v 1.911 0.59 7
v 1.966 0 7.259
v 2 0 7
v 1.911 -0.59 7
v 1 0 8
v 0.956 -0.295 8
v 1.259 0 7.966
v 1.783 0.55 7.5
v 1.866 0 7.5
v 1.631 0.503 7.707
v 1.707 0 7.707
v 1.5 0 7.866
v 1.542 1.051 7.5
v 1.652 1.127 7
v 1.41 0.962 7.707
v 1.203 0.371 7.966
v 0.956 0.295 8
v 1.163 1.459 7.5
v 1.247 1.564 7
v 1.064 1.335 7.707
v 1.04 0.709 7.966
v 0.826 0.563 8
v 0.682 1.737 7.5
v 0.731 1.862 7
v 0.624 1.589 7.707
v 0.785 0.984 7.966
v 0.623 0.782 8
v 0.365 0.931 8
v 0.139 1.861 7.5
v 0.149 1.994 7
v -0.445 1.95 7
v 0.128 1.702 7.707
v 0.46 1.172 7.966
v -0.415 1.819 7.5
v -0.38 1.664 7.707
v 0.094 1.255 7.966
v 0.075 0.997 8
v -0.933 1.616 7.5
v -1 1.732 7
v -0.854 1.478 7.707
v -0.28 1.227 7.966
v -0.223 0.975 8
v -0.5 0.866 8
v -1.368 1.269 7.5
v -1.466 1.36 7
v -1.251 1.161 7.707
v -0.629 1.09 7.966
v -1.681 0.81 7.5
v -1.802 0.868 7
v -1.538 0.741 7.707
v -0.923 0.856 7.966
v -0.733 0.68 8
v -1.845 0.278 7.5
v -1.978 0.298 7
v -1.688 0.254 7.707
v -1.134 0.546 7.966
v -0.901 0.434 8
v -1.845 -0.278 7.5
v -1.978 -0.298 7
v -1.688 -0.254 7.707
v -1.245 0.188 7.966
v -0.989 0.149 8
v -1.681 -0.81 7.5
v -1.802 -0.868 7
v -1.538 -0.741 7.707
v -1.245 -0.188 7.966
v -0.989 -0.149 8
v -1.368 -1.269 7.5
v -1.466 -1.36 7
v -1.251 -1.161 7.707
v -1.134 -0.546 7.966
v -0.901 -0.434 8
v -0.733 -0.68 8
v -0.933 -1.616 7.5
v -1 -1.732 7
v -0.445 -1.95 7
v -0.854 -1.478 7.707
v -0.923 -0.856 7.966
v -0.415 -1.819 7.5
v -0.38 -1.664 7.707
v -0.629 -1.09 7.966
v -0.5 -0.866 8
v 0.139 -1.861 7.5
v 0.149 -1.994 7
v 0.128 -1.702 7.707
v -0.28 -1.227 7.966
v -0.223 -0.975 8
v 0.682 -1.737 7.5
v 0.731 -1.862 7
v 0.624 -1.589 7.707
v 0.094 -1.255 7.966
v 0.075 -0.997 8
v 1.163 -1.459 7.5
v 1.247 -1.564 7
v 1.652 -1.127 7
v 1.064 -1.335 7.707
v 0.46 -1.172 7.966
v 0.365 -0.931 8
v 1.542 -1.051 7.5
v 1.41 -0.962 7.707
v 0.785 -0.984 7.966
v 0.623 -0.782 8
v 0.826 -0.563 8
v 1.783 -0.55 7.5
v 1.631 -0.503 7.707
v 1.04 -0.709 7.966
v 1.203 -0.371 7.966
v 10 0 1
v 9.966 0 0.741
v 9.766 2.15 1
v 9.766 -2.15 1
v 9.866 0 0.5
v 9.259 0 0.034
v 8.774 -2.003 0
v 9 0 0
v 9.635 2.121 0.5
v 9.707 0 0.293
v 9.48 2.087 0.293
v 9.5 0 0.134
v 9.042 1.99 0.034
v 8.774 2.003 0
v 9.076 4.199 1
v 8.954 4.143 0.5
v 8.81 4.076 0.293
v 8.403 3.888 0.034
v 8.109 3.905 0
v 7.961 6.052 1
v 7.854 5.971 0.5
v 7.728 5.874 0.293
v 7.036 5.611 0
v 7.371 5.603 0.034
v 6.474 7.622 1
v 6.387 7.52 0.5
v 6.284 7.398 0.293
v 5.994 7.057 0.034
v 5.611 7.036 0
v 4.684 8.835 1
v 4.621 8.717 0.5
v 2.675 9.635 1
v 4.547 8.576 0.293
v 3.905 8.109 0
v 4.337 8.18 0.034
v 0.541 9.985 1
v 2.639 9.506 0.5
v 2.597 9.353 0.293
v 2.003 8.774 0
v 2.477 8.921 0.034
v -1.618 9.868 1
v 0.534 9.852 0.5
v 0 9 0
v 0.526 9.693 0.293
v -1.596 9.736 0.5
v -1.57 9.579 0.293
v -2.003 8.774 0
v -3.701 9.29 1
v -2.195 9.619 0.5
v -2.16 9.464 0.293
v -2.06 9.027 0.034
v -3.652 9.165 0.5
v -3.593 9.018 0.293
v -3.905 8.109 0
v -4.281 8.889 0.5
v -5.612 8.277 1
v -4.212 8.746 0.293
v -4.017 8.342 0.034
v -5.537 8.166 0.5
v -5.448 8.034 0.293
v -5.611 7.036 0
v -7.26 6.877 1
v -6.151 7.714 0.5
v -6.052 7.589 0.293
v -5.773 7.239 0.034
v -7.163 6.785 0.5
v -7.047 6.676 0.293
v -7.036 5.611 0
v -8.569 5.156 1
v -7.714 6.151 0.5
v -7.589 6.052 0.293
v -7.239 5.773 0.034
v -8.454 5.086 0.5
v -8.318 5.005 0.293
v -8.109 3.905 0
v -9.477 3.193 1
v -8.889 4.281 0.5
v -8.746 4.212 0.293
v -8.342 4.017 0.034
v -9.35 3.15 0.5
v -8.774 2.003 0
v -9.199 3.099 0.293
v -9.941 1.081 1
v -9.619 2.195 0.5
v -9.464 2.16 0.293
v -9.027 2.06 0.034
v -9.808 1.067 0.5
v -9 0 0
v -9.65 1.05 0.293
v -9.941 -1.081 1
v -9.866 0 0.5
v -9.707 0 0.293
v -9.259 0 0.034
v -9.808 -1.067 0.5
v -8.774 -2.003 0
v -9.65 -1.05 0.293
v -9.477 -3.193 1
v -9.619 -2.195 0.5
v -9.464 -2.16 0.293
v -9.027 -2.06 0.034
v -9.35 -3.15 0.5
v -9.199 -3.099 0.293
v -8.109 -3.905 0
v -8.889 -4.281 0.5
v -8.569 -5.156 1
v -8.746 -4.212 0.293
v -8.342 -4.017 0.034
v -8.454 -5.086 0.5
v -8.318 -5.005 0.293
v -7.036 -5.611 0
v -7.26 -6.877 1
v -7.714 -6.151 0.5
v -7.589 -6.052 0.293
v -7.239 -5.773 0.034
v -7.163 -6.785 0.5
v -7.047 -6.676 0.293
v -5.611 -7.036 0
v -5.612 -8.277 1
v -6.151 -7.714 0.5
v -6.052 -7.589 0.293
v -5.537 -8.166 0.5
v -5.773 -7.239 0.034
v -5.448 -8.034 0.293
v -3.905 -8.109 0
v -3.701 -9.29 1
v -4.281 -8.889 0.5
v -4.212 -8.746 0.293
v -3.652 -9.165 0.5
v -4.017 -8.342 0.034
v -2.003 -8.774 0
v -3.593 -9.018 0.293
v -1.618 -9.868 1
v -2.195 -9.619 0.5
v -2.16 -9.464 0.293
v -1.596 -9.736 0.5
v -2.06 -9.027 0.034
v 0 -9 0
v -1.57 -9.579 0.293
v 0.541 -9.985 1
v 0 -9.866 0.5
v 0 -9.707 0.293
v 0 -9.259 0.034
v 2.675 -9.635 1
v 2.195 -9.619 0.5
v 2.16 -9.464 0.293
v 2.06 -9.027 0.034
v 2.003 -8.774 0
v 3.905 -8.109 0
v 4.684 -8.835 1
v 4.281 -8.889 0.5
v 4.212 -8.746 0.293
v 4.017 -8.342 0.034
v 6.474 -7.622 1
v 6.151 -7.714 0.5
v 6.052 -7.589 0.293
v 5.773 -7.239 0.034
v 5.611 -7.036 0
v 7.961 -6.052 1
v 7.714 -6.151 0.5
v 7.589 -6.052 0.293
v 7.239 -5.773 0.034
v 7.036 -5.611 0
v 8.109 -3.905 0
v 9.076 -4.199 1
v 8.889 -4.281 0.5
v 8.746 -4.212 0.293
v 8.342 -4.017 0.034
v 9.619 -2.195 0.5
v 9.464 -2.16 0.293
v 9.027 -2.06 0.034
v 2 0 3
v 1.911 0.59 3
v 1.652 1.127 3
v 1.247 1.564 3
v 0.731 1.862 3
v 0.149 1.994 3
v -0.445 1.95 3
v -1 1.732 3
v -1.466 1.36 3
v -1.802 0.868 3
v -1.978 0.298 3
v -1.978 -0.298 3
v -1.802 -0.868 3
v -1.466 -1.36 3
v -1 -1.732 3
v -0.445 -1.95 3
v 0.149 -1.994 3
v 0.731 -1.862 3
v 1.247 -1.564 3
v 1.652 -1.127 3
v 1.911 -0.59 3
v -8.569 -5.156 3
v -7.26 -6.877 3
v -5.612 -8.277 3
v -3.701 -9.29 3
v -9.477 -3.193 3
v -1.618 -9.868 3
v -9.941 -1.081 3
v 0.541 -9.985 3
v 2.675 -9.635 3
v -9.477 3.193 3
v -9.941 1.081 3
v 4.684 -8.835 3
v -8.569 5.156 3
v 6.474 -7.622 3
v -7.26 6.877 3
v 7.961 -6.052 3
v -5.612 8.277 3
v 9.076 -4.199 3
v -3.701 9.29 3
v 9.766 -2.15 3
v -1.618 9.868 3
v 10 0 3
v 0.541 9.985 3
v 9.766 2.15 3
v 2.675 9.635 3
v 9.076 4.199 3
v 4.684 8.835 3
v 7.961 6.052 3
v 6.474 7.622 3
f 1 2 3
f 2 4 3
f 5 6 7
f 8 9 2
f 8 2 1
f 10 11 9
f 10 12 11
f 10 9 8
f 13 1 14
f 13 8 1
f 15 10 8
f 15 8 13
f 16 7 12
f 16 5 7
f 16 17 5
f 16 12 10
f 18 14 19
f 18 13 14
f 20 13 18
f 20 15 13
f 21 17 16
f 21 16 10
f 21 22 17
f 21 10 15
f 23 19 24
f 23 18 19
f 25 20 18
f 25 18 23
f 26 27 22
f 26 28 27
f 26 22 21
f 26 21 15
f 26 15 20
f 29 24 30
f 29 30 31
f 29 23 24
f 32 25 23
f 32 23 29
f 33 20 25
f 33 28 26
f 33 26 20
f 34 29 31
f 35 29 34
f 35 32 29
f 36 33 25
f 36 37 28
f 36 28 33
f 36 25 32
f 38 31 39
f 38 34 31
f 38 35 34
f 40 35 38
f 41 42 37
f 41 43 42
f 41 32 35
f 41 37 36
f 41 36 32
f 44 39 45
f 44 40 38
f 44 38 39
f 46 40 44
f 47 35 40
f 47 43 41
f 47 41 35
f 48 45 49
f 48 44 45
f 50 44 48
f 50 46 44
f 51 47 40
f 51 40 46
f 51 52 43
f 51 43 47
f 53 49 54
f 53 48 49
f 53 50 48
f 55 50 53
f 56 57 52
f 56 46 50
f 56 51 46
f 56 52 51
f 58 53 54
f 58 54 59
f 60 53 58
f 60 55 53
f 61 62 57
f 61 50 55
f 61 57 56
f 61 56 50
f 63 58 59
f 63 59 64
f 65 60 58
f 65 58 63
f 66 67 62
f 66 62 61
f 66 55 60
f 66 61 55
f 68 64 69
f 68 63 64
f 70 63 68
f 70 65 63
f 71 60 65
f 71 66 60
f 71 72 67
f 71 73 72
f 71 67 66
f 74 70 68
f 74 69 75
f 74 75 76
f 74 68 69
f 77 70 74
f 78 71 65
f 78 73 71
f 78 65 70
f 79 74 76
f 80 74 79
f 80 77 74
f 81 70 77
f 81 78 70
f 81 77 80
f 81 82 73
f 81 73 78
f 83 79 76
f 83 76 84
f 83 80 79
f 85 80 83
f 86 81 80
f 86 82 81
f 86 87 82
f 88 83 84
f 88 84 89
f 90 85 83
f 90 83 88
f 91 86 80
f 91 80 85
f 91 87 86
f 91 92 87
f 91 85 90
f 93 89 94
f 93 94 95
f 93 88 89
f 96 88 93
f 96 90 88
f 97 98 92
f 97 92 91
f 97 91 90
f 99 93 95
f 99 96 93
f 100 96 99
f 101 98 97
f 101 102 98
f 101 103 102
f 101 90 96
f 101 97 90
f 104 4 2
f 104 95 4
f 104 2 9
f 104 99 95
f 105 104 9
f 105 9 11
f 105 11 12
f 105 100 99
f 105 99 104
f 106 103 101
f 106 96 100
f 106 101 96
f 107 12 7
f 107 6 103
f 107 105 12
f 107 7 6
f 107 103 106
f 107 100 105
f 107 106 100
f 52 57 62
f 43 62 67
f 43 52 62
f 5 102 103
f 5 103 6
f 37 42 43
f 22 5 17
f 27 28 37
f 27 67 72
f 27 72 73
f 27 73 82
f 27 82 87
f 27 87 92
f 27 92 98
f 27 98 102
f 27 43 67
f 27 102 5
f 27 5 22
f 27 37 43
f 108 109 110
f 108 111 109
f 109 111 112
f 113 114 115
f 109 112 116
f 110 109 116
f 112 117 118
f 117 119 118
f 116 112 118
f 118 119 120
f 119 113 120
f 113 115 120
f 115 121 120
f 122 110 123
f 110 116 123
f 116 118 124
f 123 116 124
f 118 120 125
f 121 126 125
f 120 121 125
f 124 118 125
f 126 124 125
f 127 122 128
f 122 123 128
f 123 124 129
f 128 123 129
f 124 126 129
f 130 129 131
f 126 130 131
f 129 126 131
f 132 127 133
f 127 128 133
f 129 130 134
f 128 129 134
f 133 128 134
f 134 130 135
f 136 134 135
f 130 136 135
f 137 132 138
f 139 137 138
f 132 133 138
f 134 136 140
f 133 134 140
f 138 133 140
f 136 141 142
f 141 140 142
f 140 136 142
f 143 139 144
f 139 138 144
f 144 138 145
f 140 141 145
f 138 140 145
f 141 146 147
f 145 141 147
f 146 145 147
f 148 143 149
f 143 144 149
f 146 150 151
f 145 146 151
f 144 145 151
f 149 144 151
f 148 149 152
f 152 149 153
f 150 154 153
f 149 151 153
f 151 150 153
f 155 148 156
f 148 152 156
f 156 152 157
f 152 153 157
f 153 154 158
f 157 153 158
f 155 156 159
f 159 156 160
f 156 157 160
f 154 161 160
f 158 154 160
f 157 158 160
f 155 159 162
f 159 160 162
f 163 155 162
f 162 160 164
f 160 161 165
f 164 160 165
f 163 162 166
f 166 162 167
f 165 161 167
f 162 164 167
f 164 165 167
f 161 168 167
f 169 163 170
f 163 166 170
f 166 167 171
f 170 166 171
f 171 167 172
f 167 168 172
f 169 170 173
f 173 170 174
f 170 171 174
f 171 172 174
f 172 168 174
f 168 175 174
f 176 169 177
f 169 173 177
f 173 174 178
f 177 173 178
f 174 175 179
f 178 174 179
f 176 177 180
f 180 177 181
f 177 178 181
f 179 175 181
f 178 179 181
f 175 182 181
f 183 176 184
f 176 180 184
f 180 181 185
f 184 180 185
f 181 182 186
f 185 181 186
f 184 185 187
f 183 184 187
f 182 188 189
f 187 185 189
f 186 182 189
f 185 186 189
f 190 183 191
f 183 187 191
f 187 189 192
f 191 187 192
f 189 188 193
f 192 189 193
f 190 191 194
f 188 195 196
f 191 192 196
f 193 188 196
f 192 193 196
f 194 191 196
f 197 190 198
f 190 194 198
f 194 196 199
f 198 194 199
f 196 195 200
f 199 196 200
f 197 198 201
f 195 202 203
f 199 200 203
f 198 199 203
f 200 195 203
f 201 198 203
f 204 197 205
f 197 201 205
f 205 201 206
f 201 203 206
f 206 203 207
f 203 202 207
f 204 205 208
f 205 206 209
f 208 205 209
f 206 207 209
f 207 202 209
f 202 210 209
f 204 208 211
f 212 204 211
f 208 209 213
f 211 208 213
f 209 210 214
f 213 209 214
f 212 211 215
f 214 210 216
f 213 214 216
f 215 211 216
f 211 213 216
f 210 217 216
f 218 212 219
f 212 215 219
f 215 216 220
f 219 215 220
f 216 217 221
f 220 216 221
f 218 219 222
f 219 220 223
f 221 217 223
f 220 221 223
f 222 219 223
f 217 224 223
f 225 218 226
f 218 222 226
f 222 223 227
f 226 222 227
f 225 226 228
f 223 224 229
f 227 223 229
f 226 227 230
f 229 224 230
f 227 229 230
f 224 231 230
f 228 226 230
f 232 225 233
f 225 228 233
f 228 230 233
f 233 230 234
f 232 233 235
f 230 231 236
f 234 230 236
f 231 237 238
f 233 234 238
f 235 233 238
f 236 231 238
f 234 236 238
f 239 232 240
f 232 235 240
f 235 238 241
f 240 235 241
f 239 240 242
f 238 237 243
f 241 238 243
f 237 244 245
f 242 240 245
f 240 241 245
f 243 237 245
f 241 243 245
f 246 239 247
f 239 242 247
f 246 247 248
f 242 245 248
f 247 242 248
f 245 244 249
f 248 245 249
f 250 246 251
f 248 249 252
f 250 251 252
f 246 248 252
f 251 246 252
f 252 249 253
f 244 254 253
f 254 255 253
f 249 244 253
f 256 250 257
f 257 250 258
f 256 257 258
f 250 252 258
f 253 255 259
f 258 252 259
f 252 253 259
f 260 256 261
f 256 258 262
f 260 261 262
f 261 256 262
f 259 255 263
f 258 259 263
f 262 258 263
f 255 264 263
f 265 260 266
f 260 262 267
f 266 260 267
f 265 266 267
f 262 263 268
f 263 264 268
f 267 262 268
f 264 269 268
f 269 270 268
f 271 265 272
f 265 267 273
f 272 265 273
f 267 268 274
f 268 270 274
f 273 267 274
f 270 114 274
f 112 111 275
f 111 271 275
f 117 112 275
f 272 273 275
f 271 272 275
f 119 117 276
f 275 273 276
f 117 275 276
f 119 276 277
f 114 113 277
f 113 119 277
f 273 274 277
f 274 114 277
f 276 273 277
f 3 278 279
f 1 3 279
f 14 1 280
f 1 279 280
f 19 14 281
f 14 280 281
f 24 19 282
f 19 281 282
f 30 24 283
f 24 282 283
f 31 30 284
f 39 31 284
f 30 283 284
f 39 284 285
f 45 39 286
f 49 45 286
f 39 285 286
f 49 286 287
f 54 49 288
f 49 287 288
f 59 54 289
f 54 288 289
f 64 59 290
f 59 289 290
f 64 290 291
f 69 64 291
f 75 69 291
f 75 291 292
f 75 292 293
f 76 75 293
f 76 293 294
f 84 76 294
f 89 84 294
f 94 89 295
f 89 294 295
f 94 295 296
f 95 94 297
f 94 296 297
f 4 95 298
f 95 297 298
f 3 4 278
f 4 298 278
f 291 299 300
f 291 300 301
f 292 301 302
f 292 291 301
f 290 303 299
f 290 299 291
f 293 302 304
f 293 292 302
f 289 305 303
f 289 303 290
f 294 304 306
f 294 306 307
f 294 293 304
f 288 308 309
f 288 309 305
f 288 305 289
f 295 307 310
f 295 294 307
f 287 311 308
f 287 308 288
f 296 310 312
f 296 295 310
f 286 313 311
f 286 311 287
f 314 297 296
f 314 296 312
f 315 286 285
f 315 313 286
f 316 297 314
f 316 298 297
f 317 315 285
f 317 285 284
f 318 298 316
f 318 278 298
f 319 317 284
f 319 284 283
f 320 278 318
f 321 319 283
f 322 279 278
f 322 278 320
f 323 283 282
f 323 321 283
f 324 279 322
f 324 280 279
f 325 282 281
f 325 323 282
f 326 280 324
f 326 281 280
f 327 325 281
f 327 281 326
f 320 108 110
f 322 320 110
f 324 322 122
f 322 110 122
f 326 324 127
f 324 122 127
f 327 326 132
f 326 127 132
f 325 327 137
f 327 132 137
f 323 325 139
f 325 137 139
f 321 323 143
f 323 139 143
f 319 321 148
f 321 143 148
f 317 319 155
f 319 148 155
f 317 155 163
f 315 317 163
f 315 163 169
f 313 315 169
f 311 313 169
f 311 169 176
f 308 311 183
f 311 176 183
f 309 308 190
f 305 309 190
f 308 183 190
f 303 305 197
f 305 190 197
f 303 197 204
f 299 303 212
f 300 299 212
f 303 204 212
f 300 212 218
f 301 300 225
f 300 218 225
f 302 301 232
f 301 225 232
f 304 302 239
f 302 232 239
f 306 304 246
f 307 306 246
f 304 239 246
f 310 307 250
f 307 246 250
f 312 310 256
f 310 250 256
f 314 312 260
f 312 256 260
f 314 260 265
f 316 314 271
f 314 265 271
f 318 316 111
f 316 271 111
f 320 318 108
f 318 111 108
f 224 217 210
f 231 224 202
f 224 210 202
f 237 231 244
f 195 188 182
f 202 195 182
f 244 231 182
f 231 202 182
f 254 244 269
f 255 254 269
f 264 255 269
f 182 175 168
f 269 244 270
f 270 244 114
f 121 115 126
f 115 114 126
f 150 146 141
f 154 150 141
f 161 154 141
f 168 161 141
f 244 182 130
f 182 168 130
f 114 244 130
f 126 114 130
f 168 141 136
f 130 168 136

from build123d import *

# Parameters (mm, degrees)
SKETCH_R     = 10
PAD_DEPTH    = 3
SKETCH001_R  = 2
PAD001_DEPTH = 5
FILLET_R     = 1
FILLET001_R  = 1


with BuildPart() as part:
    # Sketch → Pad (new body)
    with BuildSketch(Plane.XY):
        Circle(SKETCH_R)
    extrude(amount=PAD_DEPTH)

    # Sketch001 (on Face3 of Pad) → Pad001 (join)
    with BuildSketch(Plane.XY.offset(3)):
        Circle(SKETCH001_R)
    extrude(amount=PAD001_DEPTH)

    # Fillet
    fillet_edges = [part.edges().sort_by_distance(p)[0] for p in [
        (-2, 0, 8),
    ]]
    fillet(fillet_edges, radius=FILLET_R)

    # Fillet001
    fillet001_edges = [part.edges().sort_by_distance(p)[0] for p in [
        (-10, 0, 0),
    ]]
    fillet(fillet001_edges, radius=FILLET001_R)


solid = part.part
